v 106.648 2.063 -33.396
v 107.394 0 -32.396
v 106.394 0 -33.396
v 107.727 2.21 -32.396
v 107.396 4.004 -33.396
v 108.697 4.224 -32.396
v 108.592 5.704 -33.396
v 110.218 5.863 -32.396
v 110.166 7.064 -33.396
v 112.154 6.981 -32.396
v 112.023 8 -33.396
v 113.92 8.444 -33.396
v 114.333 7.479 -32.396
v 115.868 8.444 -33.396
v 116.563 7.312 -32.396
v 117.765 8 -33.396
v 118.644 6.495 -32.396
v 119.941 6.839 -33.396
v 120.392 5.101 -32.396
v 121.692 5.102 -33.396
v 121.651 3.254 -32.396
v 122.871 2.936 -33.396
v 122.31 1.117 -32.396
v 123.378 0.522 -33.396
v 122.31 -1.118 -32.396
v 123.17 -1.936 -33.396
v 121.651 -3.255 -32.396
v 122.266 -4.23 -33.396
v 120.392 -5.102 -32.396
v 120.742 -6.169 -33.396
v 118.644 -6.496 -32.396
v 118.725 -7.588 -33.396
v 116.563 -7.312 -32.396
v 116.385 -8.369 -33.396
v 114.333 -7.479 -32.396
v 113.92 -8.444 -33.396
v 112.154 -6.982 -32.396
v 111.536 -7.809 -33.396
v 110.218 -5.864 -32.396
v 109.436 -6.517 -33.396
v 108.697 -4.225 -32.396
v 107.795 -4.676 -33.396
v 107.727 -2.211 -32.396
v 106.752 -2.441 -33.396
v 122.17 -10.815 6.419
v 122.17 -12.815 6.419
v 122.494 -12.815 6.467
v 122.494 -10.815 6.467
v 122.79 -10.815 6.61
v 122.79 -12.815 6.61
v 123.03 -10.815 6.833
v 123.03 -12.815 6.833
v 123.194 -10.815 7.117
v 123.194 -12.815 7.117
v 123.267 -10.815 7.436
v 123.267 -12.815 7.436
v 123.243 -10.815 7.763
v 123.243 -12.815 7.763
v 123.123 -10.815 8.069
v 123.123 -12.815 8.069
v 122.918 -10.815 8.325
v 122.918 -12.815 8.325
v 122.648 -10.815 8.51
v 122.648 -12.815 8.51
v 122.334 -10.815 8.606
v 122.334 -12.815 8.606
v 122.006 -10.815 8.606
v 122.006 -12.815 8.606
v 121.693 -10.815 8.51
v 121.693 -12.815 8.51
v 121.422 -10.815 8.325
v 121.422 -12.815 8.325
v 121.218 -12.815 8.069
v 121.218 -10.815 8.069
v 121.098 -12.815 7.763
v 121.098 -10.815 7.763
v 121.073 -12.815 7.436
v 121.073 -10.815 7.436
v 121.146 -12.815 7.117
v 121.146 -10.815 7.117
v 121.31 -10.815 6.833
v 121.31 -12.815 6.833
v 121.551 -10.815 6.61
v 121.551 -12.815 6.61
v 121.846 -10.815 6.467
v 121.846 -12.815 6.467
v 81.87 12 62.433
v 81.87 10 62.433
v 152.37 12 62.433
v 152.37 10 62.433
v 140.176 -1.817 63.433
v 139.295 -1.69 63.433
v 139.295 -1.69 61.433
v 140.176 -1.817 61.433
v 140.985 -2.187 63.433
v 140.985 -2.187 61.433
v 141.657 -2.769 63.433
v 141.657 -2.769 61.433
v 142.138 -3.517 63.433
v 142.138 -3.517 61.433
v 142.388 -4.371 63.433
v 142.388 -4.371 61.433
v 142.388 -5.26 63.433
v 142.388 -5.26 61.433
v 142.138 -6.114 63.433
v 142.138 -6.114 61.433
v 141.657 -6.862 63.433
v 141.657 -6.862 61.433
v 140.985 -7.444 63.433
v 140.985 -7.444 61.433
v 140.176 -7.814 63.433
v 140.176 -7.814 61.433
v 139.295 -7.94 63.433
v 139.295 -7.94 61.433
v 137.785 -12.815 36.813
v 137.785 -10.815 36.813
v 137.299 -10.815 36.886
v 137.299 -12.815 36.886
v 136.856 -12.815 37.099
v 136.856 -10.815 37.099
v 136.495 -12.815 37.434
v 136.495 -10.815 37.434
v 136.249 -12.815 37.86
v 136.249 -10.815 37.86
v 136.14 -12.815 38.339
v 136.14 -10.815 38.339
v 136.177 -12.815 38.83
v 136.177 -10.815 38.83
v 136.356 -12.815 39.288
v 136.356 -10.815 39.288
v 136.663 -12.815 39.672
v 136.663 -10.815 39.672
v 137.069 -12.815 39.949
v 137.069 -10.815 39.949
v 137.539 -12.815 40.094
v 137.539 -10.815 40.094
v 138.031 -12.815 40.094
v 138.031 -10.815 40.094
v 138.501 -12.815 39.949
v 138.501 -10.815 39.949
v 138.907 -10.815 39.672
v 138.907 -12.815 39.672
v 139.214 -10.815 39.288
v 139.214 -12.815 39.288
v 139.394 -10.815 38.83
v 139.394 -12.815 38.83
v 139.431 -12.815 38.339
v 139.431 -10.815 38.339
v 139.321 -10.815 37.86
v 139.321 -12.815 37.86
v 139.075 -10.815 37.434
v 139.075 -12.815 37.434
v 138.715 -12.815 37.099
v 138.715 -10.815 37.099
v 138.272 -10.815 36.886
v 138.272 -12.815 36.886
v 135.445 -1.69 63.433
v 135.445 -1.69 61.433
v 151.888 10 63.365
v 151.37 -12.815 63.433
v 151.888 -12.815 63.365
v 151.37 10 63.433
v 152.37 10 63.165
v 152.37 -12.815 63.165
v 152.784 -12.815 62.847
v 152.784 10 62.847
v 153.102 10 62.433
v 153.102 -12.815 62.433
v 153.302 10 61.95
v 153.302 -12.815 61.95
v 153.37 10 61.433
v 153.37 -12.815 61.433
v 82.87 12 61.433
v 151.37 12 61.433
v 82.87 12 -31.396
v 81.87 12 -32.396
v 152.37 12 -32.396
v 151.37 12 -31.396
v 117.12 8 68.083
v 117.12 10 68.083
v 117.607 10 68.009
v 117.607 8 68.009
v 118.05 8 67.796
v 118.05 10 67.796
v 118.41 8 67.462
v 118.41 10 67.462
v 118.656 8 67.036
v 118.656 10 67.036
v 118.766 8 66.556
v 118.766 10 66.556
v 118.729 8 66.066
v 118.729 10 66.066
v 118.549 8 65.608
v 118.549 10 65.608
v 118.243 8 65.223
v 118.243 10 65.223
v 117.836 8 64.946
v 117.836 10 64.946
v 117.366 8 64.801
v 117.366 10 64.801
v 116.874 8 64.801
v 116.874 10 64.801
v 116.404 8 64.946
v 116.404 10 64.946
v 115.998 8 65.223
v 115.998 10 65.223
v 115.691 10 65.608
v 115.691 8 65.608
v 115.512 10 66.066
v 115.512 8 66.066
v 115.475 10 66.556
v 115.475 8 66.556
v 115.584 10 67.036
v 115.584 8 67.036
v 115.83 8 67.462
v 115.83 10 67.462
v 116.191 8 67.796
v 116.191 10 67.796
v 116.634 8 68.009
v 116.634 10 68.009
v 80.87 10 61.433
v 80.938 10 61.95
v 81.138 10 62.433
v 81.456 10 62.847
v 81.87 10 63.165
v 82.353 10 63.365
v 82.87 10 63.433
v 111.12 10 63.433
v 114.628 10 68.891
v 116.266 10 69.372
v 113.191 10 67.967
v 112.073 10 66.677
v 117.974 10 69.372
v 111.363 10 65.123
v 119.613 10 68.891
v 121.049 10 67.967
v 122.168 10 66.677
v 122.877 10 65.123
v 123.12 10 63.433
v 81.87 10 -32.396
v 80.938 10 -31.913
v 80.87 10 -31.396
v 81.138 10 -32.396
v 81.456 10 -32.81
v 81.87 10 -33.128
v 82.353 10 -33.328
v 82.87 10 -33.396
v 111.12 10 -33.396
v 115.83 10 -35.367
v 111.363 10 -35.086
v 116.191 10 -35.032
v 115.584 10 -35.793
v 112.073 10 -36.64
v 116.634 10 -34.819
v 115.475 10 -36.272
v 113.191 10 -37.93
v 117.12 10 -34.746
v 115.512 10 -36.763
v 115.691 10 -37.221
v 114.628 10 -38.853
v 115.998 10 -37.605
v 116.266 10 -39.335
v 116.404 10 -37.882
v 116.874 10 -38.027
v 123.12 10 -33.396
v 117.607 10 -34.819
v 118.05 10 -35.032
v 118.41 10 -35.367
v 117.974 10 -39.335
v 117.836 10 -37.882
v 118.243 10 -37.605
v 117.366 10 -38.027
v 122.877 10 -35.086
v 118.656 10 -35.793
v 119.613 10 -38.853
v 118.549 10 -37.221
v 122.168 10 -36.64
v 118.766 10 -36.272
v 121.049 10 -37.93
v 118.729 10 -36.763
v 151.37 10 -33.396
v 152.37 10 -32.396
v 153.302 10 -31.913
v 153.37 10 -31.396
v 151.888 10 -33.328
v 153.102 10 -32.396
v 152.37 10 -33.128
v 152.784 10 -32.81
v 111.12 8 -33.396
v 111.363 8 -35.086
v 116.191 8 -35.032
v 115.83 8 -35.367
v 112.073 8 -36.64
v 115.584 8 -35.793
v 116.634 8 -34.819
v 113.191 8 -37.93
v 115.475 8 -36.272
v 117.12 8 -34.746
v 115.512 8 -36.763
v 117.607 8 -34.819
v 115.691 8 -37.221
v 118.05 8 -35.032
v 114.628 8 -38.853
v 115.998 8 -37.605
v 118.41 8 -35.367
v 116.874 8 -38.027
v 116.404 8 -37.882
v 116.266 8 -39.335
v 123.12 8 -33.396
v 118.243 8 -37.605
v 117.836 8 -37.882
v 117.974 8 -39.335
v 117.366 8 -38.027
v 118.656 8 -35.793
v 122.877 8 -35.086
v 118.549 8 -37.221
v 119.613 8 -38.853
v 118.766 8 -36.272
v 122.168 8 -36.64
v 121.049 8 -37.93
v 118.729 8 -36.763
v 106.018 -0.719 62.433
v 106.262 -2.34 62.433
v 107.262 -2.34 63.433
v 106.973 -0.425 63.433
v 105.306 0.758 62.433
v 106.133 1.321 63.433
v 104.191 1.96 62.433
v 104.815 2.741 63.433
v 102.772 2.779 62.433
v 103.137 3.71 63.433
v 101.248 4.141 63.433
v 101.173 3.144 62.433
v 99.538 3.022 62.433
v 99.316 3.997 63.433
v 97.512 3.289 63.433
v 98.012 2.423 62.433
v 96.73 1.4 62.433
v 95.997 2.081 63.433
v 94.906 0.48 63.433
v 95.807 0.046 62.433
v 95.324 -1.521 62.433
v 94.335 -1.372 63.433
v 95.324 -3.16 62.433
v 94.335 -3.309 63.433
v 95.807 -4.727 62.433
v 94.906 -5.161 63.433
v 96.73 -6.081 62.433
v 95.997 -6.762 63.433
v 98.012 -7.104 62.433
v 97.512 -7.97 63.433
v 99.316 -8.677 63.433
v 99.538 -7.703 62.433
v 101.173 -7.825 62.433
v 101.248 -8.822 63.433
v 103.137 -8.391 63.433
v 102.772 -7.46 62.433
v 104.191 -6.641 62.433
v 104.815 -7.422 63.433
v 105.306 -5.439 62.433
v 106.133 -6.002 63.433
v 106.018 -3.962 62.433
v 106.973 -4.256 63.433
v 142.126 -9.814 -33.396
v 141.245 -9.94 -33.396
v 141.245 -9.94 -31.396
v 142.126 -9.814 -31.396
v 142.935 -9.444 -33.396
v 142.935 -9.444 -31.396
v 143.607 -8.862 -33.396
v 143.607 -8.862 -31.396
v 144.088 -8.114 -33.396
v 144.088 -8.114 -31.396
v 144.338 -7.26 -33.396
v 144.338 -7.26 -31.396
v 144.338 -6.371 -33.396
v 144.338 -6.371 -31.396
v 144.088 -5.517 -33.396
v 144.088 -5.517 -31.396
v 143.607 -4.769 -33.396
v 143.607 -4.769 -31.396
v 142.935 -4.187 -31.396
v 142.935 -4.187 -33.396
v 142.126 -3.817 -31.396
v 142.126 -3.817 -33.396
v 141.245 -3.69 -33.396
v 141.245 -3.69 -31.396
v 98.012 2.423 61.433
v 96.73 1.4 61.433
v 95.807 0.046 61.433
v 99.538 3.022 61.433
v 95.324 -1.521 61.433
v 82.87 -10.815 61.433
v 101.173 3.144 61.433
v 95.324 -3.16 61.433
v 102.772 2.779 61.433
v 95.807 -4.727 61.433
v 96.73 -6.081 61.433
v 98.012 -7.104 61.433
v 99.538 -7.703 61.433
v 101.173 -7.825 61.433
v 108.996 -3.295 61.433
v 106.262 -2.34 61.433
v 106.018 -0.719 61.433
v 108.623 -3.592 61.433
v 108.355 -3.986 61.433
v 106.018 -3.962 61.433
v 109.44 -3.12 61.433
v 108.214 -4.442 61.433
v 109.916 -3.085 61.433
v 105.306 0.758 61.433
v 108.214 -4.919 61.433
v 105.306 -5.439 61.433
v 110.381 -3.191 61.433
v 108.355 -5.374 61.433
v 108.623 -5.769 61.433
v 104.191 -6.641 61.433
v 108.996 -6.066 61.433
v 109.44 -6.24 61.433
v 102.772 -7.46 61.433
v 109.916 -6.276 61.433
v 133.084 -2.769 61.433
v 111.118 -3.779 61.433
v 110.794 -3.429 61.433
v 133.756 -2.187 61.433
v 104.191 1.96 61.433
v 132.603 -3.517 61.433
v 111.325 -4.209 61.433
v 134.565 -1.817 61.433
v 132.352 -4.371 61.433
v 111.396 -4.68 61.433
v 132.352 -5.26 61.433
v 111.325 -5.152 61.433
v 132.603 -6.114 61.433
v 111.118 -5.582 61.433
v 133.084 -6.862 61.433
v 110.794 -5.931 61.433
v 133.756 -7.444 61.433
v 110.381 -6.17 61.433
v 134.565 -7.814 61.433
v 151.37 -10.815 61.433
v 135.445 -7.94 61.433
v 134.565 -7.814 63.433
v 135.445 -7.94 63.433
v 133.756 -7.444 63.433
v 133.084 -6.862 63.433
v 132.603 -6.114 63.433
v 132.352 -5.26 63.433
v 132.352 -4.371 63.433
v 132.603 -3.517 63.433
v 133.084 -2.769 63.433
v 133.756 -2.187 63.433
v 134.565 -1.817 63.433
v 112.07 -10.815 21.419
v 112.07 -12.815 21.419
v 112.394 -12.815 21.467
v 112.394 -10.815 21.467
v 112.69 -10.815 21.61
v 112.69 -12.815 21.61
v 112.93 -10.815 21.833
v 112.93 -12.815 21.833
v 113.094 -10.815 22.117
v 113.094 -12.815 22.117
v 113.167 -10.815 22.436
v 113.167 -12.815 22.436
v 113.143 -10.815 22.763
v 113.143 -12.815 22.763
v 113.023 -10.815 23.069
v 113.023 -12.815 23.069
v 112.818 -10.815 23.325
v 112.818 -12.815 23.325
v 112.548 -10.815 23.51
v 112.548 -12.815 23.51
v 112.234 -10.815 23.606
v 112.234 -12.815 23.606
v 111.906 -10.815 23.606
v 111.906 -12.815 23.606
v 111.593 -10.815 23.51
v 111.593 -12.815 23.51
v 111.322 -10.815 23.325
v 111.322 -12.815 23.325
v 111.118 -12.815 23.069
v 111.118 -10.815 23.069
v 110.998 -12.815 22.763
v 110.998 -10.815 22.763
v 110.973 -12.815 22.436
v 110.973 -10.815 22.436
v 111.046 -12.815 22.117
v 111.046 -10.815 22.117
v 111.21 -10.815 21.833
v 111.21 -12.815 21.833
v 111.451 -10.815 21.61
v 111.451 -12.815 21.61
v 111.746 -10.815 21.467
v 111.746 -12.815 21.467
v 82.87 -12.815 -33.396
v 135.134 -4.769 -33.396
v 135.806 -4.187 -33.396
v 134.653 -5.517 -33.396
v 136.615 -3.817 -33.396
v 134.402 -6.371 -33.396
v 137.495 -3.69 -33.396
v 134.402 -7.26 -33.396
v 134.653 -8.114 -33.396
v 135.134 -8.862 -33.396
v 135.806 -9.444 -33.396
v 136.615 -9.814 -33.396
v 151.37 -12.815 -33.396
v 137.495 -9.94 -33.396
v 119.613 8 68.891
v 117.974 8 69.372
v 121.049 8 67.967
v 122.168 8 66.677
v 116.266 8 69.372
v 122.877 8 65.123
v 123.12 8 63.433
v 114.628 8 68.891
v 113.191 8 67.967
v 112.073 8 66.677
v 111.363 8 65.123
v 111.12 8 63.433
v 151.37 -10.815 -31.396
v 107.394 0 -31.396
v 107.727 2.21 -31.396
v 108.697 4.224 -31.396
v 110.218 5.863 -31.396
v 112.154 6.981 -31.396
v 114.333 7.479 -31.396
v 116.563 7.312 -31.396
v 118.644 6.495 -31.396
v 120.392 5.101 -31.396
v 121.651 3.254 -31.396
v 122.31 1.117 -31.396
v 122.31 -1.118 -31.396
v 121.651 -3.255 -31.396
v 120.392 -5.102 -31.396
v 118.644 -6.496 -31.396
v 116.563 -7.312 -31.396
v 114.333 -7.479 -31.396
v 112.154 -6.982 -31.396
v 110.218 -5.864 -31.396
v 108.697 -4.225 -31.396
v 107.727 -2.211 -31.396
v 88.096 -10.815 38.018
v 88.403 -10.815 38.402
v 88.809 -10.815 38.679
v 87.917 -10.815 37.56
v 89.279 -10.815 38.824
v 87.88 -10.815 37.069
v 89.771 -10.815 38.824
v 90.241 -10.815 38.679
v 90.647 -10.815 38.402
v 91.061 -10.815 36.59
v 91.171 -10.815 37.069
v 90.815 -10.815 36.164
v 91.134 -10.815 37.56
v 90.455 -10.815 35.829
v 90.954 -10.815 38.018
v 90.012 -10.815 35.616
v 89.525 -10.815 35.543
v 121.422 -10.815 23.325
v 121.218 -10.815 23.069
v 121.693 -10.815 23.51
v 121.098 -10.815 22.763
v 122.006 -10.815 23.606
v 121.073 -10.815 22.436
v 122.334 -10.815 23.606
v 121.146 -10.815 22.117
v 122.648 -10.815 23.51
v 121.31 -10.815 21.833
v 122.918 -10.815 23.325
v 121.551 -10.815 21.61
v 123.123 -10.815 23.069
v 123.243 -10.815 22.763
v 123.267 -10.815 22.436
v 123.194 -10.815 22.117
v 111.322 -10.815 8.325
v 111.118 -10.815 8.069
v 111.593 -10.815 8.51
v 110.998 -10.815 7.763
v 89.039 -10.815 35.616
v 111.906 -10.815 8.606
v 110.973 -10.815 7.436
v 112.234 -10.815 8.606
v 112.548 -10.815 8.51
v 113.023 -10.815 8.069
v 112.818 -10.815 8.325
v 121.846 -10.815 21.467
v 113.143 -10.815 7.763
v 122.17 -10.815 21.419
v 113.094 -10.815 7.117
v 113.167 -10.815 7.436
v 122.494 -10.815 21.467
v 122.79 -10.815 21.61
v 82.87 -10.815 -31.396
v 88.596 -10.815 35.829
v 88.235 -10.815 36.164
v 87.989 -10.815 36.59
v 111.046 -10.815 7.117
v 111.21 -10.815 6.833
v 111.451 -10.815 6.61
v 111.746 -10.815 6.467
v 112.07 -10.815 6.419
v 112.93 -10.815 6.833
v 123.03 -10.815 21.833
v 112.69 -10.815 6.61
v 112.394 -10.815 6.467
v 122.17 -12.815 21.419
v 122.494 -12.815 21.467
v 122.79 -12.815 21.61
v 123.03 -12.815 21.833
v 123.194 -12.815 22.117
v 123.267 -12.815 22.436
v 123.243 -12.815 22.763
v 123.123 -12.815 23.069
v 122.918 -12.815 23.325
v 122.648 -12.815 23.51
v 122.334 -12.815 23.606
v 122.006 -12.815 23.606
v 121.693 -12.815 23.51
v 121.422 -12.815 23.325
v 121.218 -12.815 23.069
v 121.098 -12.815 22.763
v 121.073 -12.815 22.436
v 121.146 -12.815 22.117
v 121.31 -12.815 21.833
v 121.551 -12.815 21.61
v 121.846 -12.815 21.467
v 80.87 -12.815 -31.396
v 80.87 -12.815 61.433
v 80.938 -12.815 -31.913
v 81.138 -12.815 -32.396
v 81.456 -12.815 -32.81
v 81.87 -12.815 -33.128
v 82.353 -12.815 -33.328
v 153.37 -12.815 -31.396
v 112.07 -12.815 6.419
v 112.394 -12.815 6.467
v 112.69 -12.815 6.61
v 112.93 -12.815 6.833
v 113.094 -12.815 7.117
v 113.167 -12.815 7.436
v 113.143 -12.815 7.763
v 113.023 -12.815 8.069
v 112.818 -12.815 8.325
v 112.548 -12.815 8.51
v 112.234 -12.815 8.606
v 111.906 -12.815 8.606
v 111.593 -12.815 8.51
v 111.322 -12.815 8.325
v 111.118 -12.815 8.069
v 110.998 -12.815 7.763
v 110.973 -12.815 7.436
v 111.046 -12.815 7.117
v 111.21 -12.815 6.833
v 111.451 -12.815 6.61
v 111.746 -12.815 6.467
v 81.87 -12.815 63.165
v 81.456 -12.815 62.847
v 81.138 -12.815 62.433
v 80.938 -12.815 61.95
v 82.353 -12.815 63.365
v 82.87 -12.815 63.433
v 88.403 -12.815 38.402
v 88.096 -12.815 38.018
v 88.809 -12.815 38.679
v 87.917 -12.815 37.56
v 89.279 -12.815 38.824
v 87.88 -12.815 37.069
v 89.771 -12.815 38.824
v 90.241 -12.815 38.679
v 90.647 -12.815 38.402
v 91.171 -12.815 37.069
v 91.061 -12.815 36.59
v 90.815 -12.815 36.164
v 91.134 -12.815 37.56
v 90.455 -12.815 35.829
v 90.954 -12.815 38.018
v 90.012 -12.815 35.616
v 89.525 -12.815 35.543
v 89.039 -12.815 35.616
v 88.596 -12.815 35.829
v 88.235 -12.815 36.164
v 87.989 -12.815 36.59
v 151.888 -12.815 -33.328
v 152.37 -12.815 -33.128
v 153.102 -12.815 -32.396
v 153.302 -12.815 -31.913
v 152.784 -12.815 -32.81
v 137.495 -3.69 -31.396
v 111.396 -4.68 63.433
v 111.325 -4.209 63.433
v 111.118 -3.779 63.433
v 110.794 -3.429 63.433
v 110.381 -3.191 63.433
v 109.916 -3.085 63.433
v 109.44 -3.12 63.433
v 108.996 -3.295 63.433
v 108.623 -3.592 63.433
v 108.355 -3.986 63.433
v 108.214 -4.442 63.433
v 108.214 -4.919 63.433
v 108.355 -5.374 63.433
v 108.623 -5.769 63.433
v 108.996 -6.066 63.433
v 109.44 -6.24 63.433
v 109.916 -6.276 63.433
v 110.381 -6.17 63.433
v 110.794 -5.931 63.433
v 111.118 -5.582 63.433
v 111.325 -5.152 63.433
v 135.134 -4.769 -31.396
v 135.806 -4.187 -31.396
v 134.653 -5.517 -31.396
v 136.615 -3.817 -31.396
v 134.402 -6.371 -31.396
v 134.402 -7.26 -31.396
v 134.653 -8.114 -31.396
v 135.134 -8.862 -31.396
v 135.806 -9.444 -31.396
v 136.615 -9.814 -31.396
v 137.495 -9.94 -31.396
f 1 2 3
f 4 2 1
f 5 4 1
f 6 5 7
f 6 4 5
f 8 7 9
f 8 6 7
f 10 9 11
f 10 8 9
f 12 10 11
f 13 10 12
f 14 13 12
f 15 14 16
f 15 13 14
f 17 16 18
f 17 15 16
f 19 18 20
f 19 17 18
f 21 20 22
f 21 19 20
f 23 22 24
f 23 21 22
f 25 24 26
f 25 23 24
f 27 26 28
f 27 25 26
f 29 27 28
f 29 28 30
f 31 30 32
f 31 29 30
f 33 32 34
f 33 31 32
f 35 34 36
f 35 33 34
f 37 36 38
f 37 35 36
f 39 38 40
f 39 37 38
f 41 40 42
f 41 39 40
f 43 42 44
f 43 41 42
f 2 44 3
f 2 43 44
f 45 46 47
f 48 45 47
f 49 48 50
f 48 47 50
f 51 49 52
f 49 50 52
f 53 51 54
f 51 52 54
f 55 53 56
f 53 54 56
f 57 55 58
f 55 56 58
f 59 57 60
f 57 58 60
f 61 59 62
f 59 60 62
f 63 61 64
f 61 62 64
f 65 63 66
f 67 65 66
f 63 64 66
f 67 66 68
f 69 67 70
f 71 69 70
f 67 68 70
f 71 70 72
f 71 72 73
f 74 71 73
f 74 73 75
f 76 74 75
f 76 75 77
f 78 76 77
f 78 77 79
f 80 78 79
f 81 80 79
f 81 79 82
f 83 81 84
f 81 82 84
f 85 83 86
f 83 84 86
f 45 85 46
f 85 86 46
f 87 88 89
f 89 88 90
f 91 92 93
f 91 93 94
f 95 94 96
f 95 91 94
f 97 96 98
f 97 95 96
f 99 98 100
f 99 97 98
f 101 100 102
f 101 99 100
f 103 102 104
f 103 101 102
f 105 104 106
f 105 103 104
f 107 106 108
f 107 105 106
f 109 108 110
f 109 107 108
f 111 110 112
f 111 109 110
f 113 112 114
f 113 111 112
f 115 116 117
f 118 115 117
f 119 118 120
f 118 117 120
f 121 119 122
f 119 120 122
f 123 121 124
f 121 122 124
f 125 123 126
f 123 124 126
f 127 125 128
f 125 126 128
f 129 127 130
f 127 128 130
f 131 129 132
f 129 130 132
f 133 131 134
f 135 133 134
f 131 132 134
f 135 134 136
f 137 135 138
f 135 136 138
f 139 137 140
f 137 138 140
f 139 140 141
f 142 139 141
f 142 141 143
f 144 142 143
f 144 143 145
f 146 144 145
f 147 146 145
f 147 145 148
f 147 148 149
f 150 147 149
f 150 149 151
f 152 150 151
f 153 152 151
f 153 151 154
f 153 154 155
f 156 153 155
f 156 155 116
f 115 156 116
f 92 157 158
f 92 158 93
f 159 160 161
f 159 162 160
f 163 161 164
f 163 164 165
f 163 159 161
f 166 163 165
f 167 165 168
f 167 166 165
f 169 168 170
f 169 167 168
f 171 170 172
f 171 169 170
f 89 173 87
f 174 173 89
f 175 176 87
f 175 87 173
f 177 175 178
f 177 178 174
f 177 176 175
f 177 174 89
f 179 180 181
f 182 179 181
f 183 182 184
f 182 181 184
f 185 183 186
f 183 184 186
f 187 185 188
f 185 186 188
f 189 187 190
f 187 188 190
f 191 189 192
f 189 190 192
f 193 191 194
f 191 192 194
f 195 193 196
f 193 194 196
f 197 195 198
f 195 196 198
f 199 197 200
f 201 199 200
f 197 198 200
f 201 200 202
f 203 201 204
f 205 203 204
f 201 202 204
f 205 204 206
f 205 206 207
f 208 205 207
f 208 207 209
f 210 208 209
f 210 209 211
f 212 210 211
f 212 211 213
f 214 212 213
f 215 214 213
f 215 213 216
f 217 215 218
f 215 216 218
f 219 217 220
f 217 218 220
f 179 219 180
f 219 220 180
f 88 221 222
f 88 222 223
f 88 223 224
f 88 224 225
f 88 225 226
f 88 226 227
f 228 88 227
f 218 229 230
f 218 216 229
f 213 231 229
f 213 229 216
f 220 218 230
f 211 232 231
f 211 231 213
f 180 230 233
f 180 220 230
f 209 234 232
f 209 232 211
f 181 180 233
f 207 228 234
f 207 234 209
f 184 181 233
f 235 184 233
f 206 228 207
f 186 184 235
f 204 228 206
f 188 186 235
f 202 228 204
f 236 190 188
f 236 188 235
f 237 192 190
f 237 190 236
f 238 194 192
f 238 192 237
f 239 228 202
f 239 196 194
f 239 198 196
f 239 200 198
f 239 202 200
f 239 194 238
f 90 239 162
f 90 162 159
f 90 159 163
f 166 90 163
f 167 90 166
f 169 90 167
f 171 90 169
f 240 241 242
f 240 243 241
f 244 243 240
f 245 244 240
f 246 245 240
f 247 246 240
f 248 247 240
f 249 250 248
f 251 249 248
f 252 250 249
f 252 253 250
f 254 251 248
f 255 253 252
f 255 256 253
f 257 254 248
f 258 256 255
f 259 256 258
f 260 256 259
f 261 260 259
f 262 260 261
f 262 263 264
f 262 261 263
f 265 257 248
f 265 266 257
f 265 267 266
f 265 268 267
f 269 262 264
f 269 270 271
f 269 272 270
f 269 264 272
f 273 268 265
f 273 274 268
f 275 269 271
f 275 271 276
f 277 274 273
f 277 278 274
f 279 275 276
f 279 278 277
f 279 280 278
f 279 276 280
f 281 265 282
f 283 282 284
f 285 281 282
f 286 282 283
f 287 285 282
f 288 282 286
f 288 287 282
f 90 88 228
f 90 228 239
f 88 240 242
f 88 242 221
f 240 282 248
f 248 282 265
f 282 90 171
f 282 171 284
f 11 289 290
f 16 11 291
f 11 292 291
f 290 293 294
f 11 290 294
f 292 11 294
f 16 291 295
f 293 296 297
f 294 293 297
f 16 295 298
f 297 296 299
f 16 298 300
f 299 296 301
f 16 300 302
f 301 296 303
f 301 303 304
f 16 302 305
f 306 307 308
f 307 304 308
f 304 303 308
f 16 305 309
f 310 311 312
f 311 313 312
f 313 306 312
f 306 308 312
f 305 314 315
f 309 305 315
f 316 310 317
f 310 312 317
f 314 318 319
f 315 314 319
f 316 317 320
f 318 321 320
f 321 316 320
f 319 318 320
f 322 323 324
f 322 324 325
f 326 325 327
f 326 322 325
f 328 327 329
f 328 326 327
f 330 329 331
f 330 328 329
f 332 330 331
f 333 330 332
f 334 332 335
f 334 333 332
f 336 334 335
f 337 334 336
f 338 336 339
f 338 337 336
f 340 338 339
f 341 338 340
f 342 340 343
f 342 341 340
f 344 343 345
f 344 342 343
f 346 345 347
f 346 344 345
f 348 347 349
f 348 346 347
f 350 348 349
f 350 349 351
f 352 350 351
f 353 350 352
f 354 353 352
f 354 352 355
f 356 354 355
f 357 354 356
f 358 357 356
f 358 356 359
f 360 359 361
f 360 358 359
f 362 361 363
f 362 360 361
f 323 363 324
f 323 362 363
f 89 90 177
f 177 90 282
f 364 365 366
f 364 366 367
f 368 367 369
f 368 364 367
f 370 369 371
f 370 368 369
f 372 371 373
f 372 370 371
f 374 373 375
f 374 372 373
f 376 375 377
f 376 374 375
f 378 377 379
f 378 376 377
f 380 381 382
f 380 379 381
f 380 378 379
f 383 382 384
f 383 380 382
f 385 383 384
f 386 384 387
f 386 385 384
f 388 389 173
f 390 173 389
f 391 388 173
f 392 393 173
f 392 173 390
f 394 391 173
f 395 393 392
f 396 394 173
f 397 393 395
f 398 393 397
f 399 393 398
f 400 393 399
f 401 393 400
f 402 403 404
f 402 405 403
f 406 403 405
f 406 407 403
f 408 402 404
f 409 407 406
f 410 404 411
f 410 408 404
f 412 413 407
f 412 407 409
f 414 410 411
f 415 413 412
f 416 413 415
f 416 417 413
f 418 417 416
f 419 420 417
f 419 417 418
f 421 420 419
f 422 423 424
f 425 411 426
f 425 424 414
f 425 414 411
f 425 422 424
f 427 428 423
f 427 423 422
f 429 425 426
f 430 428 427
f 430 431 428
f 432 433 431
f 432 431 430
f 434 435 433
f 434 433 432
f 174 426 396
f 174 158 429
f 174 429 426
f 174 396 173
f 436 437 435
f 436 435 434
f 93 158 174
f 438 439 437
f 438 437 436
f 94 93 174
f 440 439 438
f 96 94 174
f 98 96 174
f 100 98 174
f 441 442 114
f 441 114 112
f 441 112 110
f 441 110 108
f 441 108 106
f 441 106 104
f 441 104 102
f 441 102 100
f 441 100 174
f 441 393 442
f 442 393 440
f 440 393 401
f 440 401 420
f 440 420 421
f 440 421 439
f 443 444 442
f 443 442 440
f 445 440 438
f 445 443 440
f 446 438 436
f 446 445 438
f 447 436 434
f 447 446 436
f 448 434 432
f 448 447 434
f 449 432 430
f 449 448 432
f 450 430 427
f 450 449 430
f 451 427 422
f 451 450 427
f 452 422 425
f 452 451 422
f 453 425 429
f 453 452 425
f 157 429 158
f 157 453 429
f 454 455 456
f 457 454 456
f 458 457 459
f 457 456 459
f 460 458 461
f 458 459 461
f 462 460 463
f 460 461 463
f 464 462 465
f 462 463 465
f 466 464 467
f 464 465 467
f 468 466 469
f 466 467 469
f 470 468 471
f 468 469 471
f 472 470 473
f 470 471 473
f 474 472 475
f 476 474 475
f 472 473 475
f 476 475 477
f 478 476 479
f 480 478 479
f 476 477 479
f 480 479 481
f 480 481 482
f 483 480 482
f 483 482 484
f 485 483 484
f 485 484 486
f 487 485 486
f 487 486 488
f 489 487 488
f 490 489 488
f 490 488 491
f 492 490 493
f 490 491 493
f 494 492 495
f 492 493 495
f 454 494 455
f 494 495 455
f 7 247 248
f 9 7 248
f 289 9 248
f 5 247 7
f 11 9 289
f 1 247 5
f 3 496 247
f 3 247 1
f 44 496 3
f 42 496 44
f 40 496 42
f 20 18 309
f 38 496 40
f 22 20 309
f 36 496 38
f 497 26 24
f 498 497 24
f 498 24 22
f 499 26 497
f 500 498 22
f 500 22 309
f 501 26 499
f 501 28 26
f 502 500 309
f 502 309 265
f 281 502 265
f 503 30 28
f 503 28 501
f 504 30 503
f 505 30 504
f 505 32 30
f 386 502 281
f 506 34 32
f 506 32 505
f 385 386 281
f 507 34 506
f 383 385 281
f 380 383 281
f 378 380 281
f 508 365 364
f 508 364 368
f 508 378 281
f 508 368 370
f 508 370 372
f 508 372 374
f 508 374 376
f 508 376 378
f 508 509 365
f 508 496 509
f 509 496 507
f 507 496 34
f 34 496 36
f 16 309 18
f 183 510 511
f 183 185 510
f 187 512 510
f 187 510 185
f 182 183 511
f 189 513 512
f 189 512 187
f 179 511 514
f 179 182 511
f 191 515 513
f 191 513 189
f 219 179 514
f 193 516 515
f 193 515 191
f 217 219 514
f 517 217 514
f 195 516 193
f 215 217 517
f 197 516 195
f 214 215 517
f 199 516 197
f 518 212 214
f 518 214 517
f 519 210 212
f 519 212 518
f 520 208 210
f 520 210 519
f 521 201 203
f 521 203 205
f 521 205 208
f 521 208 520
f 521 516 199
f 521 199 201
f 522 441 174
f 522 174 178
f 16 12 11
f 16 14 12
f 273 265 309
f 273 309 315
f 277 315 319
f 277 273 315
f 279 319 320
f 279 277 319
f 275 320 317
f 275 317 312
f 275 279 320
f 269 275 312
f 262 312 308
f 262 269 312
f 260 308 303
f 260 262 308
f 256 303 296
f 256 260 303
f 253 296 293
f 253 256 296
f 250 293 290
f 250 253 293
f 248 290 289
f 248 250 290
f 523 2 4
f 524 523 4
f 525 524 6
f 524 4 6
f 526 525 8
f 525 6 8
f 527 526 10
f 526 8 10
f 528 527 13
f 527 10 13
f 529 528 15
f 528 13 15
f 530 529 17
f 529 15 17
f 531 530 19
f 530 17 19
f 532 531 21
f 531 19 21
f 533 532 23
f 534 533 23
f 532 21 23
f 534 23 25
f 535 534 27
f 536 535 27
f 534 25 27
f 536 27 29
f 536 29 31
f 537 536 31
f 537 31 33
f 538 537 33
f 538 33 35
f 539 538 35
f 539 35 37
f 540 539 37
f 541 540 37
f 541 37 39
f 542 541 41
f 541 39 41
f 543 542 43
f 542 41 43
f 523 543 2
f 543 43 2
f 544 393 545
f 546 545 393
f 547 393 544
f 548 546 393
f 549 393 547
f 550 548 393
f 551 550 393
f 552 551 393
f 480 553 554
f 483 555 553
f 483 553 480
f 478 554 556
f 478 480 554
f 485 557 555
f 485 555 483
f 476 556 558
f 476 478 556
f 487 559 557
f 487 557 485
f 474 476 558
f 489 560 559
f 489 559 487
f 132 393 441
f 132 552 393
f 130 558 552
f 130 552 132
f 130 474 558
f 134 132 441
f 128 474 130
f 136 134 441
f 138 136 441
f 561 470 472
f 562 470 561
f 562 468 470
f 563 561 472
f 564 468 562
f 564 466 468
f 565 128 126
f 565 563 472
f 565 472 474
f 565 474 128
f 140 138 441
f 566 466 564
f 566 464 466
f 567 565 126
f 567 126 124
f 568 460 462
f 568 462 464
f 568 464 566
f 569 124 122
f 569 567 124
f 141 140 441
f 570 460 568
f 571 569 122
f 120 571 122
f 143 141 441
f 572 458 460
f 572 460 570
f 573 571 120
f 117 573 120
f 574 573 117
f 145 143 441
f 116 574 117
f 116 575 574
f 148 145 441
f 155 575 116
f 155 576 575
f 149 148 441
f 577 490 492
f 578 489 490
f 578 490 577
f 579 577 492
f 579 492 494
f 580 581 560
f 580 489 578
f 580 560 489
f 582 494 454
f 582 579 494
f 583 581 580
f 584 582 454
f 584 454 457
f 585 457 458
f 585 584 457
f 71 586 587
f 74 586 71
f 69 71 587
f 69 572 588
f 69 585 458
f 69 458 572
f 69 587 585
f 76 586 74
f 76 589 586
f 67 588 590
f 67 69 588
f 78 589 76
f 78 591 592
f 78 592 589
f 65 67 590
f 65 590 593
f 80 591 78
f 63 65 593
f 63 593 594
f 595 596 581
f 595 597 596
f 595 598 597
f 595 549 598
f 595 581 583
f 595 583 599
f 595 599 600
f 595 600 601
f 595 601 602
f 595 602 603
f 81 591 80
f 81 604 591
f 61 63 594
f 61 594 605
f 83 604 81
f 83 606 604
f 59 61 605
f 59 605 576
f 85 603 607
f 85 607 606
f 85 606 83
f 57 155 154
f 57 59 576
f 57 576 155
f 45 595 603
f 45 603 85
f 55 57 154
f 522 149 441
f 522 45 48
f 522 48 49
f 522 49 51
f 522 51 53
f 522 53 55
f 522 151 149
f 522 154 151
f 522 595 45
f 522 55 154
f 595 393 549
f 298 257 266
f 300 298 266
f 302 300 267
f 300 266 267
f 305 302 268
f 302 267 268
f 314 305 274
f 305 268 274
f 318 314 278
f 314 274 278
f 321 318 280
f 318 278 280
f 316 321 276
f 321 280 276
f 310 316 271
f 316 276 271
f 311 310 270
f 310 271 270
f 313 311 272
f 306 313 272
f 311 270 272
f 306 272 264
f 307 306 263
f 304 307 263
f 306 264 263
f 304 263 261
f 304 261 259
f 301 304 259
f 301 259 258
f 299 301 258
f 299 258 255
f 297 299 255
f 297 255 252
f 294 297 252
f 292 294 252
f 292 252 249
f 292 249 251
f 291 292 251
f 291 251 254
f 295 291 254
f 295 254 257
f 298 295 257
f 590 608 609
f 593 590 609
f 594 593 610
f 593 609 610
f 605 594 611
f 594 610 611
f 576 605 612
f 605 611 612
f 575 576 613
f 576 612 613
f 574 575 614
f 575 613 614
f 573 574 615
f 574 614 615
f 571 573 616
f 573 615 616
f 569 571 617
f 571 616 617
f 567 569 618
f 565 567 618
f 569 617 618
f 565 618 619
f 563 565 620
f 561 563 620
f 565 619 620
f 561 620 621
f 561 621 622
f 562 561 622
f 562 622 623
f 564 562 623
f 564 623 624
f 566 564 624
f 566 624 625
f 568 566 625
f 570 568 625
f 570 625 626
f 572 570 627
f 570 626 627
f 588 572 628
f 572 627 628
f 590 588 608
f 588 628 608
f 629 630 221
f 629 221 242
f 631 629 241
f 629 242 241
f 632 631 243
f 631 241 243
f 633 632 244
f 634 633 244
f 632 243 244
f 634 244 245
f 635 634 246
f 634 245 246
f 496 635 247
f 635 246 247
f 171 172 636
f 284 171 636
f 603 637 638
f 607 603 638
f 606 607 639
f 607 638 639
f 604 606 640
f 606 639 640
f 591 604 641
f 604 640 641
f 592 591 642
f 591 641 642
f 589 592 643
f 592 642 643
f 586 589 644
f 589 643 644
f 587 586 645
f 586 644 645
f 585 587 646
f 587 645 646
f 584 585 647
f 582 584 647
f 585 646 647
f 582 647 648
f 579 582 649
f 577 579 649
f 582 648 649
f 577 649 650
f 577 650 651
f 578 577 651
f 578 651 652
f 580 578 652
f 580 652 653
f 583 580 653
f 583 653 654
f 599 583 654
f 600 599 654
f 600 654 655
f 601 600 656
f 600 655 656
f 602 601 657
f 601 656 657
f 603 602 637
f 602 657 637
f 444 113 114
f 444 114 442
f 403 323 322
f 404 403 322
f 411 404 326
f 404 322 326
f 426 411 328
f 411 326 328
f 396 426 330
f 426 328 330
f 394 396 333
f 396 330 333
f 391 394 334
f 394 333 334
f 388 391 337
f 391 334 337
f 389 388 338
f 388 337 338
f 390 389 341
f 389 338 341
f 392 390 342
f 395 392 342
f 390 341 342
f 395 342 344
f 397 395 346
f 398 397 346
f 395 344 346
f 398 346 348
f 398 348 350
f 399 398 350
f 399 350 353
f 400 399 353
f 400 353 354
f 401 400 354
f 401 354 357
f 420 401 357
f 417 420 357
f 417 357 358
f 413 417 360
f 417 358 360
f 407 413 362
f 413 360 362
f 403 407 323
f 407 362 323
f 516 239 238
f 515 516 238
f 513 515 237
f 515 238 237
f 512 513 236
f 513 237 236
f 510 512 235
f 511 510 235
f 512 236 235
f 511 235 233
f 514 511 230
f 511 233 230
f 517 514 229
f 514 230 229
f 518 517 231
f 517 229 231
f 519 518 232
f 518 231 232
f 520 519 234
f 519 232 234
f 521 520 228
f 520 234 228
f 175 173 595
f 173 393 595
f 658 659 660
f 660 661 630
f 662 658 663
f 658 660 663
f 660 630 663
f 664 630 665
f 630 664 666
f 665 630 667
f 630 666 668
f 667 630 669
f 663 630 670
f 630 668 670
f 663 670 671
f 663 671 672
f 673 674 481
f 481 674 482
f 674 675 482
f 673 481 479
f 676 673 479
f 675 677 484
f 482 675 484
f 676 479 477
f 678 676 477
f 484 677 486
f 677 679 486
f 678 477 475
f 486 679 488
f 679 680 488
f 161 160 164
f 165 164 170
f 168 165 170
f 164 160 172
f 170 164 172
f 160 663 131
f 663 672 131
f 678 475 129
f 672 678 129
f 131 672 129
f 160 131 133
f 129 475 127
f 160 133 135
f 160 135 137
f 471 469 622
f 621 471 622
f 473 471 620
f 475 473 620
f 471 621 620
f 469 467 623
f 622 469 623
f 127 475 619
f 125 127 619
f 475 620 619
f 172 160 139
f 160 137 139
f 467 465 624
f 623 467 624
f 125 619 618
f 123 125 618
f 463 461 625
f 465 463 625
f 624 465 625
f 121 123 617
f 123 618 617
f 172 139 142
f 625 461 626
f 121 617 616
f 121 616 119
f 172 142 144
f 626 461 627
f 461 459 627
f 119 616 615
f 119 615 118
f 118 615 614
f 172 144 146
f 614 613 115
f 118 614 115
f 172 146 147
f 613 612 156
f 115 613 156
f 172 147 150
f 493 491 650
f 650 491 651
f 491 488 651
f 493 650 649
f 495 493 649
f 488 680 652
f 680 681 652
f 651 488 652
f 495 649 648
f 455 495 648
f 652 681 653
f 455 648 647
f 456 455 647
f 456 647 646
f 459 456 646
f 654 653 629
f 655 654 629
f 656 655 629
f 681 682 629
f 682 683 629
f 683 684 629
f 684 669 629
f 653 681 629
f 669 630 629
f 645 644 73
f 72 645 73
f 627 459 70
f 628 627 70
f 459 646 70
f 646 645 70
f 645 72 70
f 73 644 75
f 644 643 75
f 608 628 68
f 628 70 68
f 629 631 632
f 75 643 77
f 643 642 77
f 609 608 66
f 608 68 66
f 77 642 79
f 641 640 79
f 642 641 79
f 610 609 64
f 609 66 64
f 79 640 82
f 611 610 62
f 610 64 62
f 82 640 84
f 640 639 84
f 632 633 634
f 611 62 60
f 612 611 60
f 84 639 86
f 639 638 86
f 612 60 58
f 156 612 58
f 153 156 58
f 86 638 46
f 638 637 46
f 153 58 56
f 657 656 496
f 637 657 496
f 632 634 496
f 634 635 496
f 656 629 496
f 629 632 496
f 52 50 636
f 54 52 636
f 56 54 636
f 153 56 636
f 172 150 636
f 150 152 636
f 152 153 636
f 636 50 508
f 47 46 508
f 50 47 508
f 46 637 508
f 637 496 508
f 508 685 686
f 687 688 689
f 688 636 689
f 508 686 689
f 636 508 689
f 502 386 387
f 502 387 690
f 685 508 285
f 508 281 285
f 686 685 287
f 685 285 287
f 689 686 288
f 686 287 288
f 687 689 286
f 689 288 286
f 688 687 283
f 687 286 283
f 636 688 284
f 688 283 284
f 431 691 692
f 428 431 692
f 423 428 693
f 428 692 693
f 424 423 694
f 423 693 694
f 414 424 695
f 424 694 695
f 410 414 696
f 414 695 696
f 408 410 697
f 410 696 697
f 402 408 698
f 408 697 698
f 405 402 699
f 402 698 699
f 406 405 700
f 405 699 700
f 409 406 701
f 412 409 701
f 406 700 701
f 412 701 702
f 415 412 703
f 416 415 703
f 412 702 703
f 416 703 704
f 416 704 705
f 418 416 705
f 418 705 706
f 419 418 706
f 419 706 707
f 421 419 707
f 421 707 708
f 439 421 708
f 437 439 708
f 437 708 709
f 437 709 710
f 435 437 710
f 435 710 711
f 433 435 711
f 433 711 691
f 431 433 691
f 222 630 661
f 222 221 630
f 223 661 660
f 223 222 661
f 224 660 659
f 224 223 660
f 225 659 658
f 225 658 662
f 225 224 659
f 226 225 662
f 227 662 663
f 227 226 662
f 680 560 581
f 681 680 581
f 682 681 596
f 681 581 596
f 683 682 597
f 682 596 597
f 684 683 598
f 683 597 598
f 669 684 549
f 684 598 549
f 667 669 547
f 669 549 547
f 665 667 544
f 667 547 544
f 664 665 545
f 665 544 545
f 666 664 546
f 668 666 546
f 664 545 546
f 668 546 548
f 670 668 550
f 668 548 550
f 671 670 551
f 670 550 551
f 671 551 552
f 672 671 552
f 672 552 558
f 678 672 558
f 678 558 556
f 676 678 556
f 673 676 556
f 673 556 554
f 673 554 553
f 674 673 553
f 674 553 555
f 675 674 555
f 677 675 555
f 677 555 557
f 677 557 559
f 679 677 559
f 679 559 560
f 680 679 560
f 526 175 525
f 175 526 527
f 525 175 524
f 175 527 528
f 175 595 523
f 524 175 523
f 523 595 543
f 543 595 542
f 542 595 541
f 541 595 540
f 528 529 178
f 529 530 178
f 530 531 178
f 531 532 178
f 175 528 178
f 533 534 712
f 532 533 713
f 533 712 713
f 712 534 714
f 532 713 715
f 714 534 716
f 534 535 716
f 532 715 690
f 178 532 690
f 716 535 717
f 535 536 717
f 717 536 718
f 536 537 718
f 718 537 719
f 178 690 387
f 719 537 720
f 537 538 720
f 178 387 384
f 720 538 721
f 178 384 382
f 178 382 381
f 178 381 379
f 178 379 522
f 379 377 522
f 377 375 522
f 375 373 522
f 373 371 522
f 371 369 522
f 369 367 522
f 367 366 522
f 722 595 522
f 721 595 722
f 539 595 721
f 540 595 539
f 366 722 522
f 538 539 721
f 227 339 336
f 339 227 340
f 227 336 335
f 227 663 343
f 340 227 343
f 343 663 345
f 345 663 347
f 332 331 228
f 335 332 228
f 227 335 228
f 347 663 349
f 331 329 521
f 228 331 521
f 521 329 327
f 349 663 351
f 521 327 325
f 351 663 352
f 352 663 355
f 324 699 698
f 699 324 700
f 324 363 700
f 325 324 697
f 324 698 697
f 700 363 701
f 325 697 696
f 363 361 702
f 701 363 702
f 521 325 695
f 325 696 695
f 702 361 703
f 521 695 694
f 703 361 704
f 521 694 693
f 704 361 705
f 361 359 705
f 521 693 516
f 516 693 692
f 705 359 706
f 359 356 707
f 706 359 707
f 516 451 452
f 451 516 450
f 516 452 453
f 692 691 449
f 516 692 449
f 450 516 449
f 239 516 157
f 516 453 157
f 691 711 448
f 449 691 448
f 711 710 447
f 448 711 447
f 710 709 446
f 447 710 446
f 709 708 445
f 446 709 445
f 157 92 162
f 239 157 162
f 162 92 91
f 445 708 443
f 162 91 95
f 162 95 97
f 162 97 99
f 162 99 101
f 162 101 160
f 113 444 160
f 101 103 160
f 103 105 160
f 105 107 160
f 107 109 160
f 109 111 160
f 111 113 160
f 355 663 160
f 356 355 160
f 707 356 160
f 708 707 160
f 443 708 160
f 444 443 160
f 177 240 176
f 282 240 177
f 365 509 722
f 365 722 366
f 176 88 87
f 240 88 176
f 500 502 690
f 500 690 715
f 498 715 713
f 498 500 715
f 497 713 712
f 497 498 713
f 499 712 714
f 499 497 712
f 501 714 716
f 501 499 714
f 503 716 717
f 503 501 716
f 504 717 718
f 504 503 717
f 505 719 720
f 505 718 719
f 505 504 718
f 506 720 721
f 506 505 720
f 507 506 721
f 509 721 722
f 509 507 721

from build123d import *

# Parameters (mm, degrees)
BOSS_EXTRUDE1_DEPTH      = 18
BOSS_EXTRUDE1_DEPTH_BACK = 12.815459
SKETCH1_W                = 72.5
SKETCH1_H                = 96.828401578
SHELL1_T                 = 2
SKETCH2_R                = 7.5
CUT_EXTRUDE1_DEPTH       = 2
CHAMFER1_SIZE            = 1
SKETCH5_R                = 5.5
CUT_EXTRUDE2_DEPTH       = 2
CHAMFER2_SIZE            = 1
SKETCH8_W                = 72.5
SKETCH8_H                = 96.828401578
CUT_EXTRUDE5_DEPTH       = 8
BOSS_EXTRUDE3_START      = 10
SKETCH10_W               = 70.5
SKETCH10_H               = 94.828401578
SKETCH10_W_2             = 68.5
SKETCH10_H_2             = 92.828401578
BOSS_EXTRUDE3_DEPTH      = 2
CUT_EXTRUDE6_REACH       = 183.831
SKETCH12_R               = 1.6
FILLET1_R                = 2
BOSS_EXTRUDE4_START      = 10
SKETCH13_R               = 1.65
BOSS_EXTRUDE4_DEPTH      = 2
SKETCH16_R               = 1.65
BOSS_EXTRUDE5_DEPTH      = 2
SKETCH17_R               = 1.65
CUT_EXTRUDE8_DEPTH       = 12.81545914
SKETCH20_R               = 1.1
CUT_EXTRUDE9_DEPTH       = 2
CUT_EXTRUDE10_REACH      = 187.096
CUT_EXTRUDE11_REACH      = 187.096


with BuildPart() as part:
    # Sketch1 → Boss-Extrude1 (new, two sides: drawn at the far end of the back side and taken through both)
    with BuildSketch(Plane(origin=(0, 0, 0), x_dir=(1, 0, 0), z_dir=(0, 1, 0)).offset(-BOSS_EXTRUDE1_DEPTH_BACK)):
        with Locations((117.12025684, -15.018542133)):
            Rectangle(SKETCH1_W, SKETCH1_H)
    extrude(amount=BOSS_EXTRUDE1_DEPTH + BOSS_EXTRUDE1_DEPTH_BACK)

    # Shell1 (no face opened: a closed hollow body)
    add(offset(amount=-SHELL1_T, mode=Mode.PRIVATE), mode=Mode.SUBTRACT)

    # Sketch2 → Cut-Extrude1 (cut)
    with BuildSketch(Plane(origin=(0, 0, -33.395658656), x_dir=(-1, 0, 0), z_dir=(0, 0, -1))):
        with Locations((-114.89374317, -0.00045914)):
            Circle(SKETCH2_R)
    extrude(amount=-CUT_EXTRUDE1_DEPTH, mode=Mode.SUBTRACT)

    # Chamfer1
    chamfer1_edges = [part.edges().sort_by_distance(p)[0] for p in [
        (122.39374317, -0.00045914, -33.395658656),
    ]]
    chamfer(chamfer1_edges, length=CHAMFER1_SIZE)

    # Sketch5 → Cut-Extrude2 (cut)
    with BuildSketch(Plane.XY.offset(63.432742922)):
        with Locations((100.762134065, -2.34045914)):
            Circle(SKETCH5_R)
    extrude(amount=-CUT_EXTRUDE2_DEPTH, mode=Mode.SUBTRACT)

    # Chamfer2
    chamfer2_edges = [part.edges().sort_by_distance(p)[0] for p in [
        (95.262134065, -2.34045914, 63.432742922),
    ]]
    chamfer(chamfer2_edges, length=CHAMFER2_SIZE)

    # Sketch8 → Cut-Extrude5 (cut)
    with BuildSketch(Plane(origin=(0, 18, 0), x_dir=(1, 0, 0), z_dir=(0, 1, 0))):
        with Locations((117.12025684, -15.018542133)):
            Rectangle(SKETCH8_W, SKETCH8_H)
    extrude(amount=-CUT_EXTRUDE5_DEPTH, mode=Mode.SUBTRACT)

    # Sketch10 → Boss-Extrude3 (add)
    with BuildSketch(Plane(origin=(0, 0, 0), x_dir=(1, 0, 0), z_dir=(0, 1, 0)).offset(BOSS_EXTRUDE3_START)):
        with Locations((117.12025684, -15.018542133)):
            Rectangle(SKETCH10_W, SKETCH10_H)
        with Locations((117.12025684, -15.018542133)):
            Rectangle(SKETCH10_W_2, SKETCH10_H_2, mode=Mode.SUBTRACT)
    extrude(amount=BOSS_EXTRUDE3_DEPTH)

    # Sketch12 → Cut-Extrude6 (cut, up to next)
    with BuildSketch(Plane.XY.offset(63.432742922), mode=Mode.PRIVATE) as cut_extrude6_sk1:
        with Locations((109.796270245, -4.680244976)):
            Circle(SKETCH12_R)
    cut_extrude6_tool1 = extrude(cut_extrude6_sk1.sketch, amount=-CUT_EXTRUDE6_REACH, mode=Mode.PRIVATE) & part.part
    add(cut_extrude6_tool1.solids().sort_by_distance((109.79627, -4.680245, 63.432743))[0], mode=Mode.SUBTRACT)

    # Fillet1
    fillet1_edges = [part.edges().sort_by_distance(p)[0] for p in [
        (80.87025684, -1.4077295, -33.395658656),
        (153.37025684, -1.4077295, -33.395658656),
        (153.37025684, -1.4077295, 63.432742922),
        (80.87025684, -1.4077295, 63.432742922),
    ]]
    fillet(fillet1_edges, radius=FILLET1_R)

    # Sketch13 → Boss-Extrude4 (add)
    with BuildSketch(Plane(origin=(0, 0, 0), x_dir=(1, 0, 0), z_dir=(0, 1, 0)).offset(BOSS_EXTRUDE4_START)):
        with BuildLine():
            Line((111.12025684, -63.432742922), (123.12025684, -63.432742922))
            ThreePointArc((123.12025684, -63.432742922), (117.12025684, -69.432742922), (111.12025684, -63.432742922))
        make_face()
        with Locations(Location((117.12025684, -66.432742922, 0), (0, 0, 270))):
            Circle(SKETCH13_R, mode=Mode.SUBTRACT)
    boss_extrude4 = extrude(amount=-BOSS_EXTRUDE4_DEPTH)

    # Sketch16 → Boss-Extrude5 (add)
    with BuildSketch(Plane(origin=(0, 10, 0), x_dir=(1, 0, 0), z_dir=(0, 1, 0))):
        with BuildLine():
            Line((111.12025684, 33.395658656), (123.12025684, 33.395658656))
            ThreePointArc((123.12025684, 33.395658656), (117.12025684, 39.395658656), (111.12025684, 33.395658656))
        make_face()
        with Locations(Location((117.12025684, 36.395658656, 0), (0, 0, 270))):
            Circle(SKETCH16_R, mode=Mode.SUBTRACT)
    extrude(amount=-BOSS_EXTRUDE5_DEPTH)

    # Sketch17 → Cut-Extrude8 (cut)
    with BuildSketch(Plane(origin=(0, 0, 0), x_dir=(1, 0, 0), z_dir=(0, 1, 0))):
        with Locations(Location((137.785174065, -38.462742922, 0), (0, 0, 90))):
            Circle(SKETCH17_R)
        with Locations(Location((89.525174065, -37.192742922, 0), (0, 0, 90))):
            Circle(SKETCH17_R)
    extrude(amount=-CUT_EXTRUDE8_DEPTH, mode=Mode.SUBTRACT)

    # Mirror1: Boss-Extrude4 across plane
    add(boss_extrude4.mirror(Plane.XY.offset(15.018542133)))

    # Sketch20 → Cut-Extrude9 (cut)
    with BuildSketch(Plane.XZ.offset(12.81545914)):
        with Locations(Location((112.07025684, 22.518542133, 0), (0, 0, 270))):
            Circle(SKETCH20_R)
        with Locations(Location((122.17025684, 22.518542133, 0), (0, 0, 270))):
            Circle(SKETCH20_R)
        with Locations(Location((122.17025684, 7.518542133, 0), (0, 0, 270))):
            Circle(SKETCH20_R)
        with Locations(Location((112.07025684, 7.518542133, 0), (0, 0, 270))):
            Circle(SKETCH20_R)
    extrude(amount=-CUT_EXTRUDE9_DEPTH, mode=Mode.SUBTRACT)

    # Sketch21 → Cut-Extrude10 (cut, up to next)
    with BuildSketch(Plane.XY.offset(63.432742922), mode=Mode.PRIVATE) as cut_extrude10_sk1:
        with BuildLine():
            Line((139.29525684, -7.94045914), (135.44525684, -7.94045914))
            ThreePointArc((135.44525684, -7.94045914), (132.32025684, -4.81545914), (135.44525684, -1.69045914))
            Line((135.44525684, -1.69045914), (139.29525684, -1.69045914))
            ThreePointArc((139.29525684, -1.69045914), (142.42025684, -4.81545914), (139.29525684, -7.94045914))
        make_face()
    cut_extrude10_tool1 = extrude(cut_extrude10_sk1.sketch, amount=-CUT_EXTRUDE10_REACH, mode=Mode.PRIVATE) & part.part
    add(cut_extrude10_tool1.solids().sort_by_distance((137.370257, -4.815459, 63.432743))[0], mode=Mode.SUBTRACT)

    # Sketch23 → Cut-Extrude11 (cut, up to next)
    with BuildSketch(Plane(origin=(0, 0, -33.395658656), x_dir=(1, 0, 0), z_dir=(0, 0, -1)), mode=Mode.PRIVATE) as cut_extrude11_sk1:
        with BuildLine():
            Line((141.24525684, 3.69045914), (137.49525684, 3.69045914))
            ThreePointArc((137.49525684, 3.69045914), (134.37025684, 6.81545914), (137.49525684, 9.94045914))
            Line((137.49525684, 9.94045914), (141.24525684, 9.94045914))
            ThreePointArc((141.24525684, 9.94045914), (144.37025684, 6.81545914), (141.24525684, 3.69045914))
        make_face()
    cut_extrude11_tool1 = extrude(cut_extrude11_sk1.sketch, amount=-CUT_EXTRUDE11_REACH, mode=Mode.PRIVATE) & part.part
    add(cut_extrude11_tool1.solids().sort_by_distance((139.370257, -6.815459, -33.395659))[0], mode=Mode.SUBTRACT)


solid = part.part
